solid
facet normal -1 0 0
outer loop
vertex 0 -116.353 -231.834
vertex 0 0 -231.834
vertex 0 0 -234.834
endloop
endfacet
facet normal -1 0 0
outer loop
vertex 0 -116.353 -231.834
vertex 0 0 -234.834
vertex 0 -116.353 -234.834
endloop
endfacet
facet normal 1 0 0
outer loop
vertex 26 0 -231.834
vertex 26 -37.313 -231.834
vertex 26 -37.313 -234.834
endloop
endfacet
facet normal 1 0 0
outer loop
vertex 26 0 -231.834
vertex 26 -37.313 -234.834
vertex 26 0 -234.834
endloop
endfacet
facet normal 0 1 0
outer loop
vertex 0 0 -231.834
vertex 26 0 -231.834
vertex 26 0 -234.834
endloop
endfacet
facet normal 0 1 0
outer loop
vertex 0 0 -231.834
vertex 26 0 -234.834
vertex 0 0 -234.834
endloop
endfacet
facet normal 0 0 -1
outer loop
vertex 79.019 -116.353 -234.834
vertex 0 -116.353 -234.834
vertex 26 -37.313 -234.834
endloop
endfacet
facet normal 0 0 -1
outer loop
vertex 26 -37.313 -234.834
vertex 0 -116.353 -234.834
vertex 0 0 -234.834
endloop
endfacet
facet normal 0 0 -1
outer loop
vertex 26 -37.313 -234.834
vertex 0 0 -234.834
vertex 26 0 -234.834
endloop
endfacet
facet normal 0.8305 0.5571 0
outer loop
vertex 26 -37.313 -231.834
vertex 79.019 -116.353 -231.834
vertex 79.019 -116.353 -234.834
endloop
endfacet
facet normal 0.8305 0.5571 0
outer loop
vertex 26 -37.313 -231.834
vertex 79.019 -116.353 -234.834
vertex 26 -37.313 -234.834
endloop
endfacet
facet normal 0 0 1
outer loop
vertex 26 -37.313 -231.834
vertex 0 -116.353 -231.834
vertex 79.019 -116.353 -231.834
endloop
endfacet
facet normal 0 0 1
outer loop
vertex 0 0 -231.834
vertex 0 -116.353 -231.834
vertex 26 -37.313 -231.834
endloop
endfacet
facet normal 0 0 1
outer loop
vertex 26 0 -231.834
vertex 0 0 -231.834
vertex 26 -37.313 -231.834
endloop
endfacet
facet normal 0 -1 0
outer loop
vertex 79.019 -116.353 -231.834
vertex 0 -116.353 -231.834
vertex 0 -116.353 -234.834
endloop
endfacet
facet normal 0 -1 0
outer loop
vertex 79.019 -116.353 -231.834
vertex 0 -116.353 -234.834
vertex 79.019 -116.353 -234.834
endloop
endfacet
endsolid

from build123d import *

# Parameters (mm, degrees)
BOSS_EXTRUDE1_DEPTH = 3


with BuildPart() as part:
    # Sketch1 → Boss-Extrude1 (new body)
    with BuildSketch(Plane.XY.offset(-231.833966153)):
        Polygon((0, 0), (0, -116.353177225), (79.018807169, -116.353177225), (26, -37.313053542), (26, 0), align=None)
    extrude(amount=-BOSS_EXTRUDE1_DEPTH)


solid = part.part
